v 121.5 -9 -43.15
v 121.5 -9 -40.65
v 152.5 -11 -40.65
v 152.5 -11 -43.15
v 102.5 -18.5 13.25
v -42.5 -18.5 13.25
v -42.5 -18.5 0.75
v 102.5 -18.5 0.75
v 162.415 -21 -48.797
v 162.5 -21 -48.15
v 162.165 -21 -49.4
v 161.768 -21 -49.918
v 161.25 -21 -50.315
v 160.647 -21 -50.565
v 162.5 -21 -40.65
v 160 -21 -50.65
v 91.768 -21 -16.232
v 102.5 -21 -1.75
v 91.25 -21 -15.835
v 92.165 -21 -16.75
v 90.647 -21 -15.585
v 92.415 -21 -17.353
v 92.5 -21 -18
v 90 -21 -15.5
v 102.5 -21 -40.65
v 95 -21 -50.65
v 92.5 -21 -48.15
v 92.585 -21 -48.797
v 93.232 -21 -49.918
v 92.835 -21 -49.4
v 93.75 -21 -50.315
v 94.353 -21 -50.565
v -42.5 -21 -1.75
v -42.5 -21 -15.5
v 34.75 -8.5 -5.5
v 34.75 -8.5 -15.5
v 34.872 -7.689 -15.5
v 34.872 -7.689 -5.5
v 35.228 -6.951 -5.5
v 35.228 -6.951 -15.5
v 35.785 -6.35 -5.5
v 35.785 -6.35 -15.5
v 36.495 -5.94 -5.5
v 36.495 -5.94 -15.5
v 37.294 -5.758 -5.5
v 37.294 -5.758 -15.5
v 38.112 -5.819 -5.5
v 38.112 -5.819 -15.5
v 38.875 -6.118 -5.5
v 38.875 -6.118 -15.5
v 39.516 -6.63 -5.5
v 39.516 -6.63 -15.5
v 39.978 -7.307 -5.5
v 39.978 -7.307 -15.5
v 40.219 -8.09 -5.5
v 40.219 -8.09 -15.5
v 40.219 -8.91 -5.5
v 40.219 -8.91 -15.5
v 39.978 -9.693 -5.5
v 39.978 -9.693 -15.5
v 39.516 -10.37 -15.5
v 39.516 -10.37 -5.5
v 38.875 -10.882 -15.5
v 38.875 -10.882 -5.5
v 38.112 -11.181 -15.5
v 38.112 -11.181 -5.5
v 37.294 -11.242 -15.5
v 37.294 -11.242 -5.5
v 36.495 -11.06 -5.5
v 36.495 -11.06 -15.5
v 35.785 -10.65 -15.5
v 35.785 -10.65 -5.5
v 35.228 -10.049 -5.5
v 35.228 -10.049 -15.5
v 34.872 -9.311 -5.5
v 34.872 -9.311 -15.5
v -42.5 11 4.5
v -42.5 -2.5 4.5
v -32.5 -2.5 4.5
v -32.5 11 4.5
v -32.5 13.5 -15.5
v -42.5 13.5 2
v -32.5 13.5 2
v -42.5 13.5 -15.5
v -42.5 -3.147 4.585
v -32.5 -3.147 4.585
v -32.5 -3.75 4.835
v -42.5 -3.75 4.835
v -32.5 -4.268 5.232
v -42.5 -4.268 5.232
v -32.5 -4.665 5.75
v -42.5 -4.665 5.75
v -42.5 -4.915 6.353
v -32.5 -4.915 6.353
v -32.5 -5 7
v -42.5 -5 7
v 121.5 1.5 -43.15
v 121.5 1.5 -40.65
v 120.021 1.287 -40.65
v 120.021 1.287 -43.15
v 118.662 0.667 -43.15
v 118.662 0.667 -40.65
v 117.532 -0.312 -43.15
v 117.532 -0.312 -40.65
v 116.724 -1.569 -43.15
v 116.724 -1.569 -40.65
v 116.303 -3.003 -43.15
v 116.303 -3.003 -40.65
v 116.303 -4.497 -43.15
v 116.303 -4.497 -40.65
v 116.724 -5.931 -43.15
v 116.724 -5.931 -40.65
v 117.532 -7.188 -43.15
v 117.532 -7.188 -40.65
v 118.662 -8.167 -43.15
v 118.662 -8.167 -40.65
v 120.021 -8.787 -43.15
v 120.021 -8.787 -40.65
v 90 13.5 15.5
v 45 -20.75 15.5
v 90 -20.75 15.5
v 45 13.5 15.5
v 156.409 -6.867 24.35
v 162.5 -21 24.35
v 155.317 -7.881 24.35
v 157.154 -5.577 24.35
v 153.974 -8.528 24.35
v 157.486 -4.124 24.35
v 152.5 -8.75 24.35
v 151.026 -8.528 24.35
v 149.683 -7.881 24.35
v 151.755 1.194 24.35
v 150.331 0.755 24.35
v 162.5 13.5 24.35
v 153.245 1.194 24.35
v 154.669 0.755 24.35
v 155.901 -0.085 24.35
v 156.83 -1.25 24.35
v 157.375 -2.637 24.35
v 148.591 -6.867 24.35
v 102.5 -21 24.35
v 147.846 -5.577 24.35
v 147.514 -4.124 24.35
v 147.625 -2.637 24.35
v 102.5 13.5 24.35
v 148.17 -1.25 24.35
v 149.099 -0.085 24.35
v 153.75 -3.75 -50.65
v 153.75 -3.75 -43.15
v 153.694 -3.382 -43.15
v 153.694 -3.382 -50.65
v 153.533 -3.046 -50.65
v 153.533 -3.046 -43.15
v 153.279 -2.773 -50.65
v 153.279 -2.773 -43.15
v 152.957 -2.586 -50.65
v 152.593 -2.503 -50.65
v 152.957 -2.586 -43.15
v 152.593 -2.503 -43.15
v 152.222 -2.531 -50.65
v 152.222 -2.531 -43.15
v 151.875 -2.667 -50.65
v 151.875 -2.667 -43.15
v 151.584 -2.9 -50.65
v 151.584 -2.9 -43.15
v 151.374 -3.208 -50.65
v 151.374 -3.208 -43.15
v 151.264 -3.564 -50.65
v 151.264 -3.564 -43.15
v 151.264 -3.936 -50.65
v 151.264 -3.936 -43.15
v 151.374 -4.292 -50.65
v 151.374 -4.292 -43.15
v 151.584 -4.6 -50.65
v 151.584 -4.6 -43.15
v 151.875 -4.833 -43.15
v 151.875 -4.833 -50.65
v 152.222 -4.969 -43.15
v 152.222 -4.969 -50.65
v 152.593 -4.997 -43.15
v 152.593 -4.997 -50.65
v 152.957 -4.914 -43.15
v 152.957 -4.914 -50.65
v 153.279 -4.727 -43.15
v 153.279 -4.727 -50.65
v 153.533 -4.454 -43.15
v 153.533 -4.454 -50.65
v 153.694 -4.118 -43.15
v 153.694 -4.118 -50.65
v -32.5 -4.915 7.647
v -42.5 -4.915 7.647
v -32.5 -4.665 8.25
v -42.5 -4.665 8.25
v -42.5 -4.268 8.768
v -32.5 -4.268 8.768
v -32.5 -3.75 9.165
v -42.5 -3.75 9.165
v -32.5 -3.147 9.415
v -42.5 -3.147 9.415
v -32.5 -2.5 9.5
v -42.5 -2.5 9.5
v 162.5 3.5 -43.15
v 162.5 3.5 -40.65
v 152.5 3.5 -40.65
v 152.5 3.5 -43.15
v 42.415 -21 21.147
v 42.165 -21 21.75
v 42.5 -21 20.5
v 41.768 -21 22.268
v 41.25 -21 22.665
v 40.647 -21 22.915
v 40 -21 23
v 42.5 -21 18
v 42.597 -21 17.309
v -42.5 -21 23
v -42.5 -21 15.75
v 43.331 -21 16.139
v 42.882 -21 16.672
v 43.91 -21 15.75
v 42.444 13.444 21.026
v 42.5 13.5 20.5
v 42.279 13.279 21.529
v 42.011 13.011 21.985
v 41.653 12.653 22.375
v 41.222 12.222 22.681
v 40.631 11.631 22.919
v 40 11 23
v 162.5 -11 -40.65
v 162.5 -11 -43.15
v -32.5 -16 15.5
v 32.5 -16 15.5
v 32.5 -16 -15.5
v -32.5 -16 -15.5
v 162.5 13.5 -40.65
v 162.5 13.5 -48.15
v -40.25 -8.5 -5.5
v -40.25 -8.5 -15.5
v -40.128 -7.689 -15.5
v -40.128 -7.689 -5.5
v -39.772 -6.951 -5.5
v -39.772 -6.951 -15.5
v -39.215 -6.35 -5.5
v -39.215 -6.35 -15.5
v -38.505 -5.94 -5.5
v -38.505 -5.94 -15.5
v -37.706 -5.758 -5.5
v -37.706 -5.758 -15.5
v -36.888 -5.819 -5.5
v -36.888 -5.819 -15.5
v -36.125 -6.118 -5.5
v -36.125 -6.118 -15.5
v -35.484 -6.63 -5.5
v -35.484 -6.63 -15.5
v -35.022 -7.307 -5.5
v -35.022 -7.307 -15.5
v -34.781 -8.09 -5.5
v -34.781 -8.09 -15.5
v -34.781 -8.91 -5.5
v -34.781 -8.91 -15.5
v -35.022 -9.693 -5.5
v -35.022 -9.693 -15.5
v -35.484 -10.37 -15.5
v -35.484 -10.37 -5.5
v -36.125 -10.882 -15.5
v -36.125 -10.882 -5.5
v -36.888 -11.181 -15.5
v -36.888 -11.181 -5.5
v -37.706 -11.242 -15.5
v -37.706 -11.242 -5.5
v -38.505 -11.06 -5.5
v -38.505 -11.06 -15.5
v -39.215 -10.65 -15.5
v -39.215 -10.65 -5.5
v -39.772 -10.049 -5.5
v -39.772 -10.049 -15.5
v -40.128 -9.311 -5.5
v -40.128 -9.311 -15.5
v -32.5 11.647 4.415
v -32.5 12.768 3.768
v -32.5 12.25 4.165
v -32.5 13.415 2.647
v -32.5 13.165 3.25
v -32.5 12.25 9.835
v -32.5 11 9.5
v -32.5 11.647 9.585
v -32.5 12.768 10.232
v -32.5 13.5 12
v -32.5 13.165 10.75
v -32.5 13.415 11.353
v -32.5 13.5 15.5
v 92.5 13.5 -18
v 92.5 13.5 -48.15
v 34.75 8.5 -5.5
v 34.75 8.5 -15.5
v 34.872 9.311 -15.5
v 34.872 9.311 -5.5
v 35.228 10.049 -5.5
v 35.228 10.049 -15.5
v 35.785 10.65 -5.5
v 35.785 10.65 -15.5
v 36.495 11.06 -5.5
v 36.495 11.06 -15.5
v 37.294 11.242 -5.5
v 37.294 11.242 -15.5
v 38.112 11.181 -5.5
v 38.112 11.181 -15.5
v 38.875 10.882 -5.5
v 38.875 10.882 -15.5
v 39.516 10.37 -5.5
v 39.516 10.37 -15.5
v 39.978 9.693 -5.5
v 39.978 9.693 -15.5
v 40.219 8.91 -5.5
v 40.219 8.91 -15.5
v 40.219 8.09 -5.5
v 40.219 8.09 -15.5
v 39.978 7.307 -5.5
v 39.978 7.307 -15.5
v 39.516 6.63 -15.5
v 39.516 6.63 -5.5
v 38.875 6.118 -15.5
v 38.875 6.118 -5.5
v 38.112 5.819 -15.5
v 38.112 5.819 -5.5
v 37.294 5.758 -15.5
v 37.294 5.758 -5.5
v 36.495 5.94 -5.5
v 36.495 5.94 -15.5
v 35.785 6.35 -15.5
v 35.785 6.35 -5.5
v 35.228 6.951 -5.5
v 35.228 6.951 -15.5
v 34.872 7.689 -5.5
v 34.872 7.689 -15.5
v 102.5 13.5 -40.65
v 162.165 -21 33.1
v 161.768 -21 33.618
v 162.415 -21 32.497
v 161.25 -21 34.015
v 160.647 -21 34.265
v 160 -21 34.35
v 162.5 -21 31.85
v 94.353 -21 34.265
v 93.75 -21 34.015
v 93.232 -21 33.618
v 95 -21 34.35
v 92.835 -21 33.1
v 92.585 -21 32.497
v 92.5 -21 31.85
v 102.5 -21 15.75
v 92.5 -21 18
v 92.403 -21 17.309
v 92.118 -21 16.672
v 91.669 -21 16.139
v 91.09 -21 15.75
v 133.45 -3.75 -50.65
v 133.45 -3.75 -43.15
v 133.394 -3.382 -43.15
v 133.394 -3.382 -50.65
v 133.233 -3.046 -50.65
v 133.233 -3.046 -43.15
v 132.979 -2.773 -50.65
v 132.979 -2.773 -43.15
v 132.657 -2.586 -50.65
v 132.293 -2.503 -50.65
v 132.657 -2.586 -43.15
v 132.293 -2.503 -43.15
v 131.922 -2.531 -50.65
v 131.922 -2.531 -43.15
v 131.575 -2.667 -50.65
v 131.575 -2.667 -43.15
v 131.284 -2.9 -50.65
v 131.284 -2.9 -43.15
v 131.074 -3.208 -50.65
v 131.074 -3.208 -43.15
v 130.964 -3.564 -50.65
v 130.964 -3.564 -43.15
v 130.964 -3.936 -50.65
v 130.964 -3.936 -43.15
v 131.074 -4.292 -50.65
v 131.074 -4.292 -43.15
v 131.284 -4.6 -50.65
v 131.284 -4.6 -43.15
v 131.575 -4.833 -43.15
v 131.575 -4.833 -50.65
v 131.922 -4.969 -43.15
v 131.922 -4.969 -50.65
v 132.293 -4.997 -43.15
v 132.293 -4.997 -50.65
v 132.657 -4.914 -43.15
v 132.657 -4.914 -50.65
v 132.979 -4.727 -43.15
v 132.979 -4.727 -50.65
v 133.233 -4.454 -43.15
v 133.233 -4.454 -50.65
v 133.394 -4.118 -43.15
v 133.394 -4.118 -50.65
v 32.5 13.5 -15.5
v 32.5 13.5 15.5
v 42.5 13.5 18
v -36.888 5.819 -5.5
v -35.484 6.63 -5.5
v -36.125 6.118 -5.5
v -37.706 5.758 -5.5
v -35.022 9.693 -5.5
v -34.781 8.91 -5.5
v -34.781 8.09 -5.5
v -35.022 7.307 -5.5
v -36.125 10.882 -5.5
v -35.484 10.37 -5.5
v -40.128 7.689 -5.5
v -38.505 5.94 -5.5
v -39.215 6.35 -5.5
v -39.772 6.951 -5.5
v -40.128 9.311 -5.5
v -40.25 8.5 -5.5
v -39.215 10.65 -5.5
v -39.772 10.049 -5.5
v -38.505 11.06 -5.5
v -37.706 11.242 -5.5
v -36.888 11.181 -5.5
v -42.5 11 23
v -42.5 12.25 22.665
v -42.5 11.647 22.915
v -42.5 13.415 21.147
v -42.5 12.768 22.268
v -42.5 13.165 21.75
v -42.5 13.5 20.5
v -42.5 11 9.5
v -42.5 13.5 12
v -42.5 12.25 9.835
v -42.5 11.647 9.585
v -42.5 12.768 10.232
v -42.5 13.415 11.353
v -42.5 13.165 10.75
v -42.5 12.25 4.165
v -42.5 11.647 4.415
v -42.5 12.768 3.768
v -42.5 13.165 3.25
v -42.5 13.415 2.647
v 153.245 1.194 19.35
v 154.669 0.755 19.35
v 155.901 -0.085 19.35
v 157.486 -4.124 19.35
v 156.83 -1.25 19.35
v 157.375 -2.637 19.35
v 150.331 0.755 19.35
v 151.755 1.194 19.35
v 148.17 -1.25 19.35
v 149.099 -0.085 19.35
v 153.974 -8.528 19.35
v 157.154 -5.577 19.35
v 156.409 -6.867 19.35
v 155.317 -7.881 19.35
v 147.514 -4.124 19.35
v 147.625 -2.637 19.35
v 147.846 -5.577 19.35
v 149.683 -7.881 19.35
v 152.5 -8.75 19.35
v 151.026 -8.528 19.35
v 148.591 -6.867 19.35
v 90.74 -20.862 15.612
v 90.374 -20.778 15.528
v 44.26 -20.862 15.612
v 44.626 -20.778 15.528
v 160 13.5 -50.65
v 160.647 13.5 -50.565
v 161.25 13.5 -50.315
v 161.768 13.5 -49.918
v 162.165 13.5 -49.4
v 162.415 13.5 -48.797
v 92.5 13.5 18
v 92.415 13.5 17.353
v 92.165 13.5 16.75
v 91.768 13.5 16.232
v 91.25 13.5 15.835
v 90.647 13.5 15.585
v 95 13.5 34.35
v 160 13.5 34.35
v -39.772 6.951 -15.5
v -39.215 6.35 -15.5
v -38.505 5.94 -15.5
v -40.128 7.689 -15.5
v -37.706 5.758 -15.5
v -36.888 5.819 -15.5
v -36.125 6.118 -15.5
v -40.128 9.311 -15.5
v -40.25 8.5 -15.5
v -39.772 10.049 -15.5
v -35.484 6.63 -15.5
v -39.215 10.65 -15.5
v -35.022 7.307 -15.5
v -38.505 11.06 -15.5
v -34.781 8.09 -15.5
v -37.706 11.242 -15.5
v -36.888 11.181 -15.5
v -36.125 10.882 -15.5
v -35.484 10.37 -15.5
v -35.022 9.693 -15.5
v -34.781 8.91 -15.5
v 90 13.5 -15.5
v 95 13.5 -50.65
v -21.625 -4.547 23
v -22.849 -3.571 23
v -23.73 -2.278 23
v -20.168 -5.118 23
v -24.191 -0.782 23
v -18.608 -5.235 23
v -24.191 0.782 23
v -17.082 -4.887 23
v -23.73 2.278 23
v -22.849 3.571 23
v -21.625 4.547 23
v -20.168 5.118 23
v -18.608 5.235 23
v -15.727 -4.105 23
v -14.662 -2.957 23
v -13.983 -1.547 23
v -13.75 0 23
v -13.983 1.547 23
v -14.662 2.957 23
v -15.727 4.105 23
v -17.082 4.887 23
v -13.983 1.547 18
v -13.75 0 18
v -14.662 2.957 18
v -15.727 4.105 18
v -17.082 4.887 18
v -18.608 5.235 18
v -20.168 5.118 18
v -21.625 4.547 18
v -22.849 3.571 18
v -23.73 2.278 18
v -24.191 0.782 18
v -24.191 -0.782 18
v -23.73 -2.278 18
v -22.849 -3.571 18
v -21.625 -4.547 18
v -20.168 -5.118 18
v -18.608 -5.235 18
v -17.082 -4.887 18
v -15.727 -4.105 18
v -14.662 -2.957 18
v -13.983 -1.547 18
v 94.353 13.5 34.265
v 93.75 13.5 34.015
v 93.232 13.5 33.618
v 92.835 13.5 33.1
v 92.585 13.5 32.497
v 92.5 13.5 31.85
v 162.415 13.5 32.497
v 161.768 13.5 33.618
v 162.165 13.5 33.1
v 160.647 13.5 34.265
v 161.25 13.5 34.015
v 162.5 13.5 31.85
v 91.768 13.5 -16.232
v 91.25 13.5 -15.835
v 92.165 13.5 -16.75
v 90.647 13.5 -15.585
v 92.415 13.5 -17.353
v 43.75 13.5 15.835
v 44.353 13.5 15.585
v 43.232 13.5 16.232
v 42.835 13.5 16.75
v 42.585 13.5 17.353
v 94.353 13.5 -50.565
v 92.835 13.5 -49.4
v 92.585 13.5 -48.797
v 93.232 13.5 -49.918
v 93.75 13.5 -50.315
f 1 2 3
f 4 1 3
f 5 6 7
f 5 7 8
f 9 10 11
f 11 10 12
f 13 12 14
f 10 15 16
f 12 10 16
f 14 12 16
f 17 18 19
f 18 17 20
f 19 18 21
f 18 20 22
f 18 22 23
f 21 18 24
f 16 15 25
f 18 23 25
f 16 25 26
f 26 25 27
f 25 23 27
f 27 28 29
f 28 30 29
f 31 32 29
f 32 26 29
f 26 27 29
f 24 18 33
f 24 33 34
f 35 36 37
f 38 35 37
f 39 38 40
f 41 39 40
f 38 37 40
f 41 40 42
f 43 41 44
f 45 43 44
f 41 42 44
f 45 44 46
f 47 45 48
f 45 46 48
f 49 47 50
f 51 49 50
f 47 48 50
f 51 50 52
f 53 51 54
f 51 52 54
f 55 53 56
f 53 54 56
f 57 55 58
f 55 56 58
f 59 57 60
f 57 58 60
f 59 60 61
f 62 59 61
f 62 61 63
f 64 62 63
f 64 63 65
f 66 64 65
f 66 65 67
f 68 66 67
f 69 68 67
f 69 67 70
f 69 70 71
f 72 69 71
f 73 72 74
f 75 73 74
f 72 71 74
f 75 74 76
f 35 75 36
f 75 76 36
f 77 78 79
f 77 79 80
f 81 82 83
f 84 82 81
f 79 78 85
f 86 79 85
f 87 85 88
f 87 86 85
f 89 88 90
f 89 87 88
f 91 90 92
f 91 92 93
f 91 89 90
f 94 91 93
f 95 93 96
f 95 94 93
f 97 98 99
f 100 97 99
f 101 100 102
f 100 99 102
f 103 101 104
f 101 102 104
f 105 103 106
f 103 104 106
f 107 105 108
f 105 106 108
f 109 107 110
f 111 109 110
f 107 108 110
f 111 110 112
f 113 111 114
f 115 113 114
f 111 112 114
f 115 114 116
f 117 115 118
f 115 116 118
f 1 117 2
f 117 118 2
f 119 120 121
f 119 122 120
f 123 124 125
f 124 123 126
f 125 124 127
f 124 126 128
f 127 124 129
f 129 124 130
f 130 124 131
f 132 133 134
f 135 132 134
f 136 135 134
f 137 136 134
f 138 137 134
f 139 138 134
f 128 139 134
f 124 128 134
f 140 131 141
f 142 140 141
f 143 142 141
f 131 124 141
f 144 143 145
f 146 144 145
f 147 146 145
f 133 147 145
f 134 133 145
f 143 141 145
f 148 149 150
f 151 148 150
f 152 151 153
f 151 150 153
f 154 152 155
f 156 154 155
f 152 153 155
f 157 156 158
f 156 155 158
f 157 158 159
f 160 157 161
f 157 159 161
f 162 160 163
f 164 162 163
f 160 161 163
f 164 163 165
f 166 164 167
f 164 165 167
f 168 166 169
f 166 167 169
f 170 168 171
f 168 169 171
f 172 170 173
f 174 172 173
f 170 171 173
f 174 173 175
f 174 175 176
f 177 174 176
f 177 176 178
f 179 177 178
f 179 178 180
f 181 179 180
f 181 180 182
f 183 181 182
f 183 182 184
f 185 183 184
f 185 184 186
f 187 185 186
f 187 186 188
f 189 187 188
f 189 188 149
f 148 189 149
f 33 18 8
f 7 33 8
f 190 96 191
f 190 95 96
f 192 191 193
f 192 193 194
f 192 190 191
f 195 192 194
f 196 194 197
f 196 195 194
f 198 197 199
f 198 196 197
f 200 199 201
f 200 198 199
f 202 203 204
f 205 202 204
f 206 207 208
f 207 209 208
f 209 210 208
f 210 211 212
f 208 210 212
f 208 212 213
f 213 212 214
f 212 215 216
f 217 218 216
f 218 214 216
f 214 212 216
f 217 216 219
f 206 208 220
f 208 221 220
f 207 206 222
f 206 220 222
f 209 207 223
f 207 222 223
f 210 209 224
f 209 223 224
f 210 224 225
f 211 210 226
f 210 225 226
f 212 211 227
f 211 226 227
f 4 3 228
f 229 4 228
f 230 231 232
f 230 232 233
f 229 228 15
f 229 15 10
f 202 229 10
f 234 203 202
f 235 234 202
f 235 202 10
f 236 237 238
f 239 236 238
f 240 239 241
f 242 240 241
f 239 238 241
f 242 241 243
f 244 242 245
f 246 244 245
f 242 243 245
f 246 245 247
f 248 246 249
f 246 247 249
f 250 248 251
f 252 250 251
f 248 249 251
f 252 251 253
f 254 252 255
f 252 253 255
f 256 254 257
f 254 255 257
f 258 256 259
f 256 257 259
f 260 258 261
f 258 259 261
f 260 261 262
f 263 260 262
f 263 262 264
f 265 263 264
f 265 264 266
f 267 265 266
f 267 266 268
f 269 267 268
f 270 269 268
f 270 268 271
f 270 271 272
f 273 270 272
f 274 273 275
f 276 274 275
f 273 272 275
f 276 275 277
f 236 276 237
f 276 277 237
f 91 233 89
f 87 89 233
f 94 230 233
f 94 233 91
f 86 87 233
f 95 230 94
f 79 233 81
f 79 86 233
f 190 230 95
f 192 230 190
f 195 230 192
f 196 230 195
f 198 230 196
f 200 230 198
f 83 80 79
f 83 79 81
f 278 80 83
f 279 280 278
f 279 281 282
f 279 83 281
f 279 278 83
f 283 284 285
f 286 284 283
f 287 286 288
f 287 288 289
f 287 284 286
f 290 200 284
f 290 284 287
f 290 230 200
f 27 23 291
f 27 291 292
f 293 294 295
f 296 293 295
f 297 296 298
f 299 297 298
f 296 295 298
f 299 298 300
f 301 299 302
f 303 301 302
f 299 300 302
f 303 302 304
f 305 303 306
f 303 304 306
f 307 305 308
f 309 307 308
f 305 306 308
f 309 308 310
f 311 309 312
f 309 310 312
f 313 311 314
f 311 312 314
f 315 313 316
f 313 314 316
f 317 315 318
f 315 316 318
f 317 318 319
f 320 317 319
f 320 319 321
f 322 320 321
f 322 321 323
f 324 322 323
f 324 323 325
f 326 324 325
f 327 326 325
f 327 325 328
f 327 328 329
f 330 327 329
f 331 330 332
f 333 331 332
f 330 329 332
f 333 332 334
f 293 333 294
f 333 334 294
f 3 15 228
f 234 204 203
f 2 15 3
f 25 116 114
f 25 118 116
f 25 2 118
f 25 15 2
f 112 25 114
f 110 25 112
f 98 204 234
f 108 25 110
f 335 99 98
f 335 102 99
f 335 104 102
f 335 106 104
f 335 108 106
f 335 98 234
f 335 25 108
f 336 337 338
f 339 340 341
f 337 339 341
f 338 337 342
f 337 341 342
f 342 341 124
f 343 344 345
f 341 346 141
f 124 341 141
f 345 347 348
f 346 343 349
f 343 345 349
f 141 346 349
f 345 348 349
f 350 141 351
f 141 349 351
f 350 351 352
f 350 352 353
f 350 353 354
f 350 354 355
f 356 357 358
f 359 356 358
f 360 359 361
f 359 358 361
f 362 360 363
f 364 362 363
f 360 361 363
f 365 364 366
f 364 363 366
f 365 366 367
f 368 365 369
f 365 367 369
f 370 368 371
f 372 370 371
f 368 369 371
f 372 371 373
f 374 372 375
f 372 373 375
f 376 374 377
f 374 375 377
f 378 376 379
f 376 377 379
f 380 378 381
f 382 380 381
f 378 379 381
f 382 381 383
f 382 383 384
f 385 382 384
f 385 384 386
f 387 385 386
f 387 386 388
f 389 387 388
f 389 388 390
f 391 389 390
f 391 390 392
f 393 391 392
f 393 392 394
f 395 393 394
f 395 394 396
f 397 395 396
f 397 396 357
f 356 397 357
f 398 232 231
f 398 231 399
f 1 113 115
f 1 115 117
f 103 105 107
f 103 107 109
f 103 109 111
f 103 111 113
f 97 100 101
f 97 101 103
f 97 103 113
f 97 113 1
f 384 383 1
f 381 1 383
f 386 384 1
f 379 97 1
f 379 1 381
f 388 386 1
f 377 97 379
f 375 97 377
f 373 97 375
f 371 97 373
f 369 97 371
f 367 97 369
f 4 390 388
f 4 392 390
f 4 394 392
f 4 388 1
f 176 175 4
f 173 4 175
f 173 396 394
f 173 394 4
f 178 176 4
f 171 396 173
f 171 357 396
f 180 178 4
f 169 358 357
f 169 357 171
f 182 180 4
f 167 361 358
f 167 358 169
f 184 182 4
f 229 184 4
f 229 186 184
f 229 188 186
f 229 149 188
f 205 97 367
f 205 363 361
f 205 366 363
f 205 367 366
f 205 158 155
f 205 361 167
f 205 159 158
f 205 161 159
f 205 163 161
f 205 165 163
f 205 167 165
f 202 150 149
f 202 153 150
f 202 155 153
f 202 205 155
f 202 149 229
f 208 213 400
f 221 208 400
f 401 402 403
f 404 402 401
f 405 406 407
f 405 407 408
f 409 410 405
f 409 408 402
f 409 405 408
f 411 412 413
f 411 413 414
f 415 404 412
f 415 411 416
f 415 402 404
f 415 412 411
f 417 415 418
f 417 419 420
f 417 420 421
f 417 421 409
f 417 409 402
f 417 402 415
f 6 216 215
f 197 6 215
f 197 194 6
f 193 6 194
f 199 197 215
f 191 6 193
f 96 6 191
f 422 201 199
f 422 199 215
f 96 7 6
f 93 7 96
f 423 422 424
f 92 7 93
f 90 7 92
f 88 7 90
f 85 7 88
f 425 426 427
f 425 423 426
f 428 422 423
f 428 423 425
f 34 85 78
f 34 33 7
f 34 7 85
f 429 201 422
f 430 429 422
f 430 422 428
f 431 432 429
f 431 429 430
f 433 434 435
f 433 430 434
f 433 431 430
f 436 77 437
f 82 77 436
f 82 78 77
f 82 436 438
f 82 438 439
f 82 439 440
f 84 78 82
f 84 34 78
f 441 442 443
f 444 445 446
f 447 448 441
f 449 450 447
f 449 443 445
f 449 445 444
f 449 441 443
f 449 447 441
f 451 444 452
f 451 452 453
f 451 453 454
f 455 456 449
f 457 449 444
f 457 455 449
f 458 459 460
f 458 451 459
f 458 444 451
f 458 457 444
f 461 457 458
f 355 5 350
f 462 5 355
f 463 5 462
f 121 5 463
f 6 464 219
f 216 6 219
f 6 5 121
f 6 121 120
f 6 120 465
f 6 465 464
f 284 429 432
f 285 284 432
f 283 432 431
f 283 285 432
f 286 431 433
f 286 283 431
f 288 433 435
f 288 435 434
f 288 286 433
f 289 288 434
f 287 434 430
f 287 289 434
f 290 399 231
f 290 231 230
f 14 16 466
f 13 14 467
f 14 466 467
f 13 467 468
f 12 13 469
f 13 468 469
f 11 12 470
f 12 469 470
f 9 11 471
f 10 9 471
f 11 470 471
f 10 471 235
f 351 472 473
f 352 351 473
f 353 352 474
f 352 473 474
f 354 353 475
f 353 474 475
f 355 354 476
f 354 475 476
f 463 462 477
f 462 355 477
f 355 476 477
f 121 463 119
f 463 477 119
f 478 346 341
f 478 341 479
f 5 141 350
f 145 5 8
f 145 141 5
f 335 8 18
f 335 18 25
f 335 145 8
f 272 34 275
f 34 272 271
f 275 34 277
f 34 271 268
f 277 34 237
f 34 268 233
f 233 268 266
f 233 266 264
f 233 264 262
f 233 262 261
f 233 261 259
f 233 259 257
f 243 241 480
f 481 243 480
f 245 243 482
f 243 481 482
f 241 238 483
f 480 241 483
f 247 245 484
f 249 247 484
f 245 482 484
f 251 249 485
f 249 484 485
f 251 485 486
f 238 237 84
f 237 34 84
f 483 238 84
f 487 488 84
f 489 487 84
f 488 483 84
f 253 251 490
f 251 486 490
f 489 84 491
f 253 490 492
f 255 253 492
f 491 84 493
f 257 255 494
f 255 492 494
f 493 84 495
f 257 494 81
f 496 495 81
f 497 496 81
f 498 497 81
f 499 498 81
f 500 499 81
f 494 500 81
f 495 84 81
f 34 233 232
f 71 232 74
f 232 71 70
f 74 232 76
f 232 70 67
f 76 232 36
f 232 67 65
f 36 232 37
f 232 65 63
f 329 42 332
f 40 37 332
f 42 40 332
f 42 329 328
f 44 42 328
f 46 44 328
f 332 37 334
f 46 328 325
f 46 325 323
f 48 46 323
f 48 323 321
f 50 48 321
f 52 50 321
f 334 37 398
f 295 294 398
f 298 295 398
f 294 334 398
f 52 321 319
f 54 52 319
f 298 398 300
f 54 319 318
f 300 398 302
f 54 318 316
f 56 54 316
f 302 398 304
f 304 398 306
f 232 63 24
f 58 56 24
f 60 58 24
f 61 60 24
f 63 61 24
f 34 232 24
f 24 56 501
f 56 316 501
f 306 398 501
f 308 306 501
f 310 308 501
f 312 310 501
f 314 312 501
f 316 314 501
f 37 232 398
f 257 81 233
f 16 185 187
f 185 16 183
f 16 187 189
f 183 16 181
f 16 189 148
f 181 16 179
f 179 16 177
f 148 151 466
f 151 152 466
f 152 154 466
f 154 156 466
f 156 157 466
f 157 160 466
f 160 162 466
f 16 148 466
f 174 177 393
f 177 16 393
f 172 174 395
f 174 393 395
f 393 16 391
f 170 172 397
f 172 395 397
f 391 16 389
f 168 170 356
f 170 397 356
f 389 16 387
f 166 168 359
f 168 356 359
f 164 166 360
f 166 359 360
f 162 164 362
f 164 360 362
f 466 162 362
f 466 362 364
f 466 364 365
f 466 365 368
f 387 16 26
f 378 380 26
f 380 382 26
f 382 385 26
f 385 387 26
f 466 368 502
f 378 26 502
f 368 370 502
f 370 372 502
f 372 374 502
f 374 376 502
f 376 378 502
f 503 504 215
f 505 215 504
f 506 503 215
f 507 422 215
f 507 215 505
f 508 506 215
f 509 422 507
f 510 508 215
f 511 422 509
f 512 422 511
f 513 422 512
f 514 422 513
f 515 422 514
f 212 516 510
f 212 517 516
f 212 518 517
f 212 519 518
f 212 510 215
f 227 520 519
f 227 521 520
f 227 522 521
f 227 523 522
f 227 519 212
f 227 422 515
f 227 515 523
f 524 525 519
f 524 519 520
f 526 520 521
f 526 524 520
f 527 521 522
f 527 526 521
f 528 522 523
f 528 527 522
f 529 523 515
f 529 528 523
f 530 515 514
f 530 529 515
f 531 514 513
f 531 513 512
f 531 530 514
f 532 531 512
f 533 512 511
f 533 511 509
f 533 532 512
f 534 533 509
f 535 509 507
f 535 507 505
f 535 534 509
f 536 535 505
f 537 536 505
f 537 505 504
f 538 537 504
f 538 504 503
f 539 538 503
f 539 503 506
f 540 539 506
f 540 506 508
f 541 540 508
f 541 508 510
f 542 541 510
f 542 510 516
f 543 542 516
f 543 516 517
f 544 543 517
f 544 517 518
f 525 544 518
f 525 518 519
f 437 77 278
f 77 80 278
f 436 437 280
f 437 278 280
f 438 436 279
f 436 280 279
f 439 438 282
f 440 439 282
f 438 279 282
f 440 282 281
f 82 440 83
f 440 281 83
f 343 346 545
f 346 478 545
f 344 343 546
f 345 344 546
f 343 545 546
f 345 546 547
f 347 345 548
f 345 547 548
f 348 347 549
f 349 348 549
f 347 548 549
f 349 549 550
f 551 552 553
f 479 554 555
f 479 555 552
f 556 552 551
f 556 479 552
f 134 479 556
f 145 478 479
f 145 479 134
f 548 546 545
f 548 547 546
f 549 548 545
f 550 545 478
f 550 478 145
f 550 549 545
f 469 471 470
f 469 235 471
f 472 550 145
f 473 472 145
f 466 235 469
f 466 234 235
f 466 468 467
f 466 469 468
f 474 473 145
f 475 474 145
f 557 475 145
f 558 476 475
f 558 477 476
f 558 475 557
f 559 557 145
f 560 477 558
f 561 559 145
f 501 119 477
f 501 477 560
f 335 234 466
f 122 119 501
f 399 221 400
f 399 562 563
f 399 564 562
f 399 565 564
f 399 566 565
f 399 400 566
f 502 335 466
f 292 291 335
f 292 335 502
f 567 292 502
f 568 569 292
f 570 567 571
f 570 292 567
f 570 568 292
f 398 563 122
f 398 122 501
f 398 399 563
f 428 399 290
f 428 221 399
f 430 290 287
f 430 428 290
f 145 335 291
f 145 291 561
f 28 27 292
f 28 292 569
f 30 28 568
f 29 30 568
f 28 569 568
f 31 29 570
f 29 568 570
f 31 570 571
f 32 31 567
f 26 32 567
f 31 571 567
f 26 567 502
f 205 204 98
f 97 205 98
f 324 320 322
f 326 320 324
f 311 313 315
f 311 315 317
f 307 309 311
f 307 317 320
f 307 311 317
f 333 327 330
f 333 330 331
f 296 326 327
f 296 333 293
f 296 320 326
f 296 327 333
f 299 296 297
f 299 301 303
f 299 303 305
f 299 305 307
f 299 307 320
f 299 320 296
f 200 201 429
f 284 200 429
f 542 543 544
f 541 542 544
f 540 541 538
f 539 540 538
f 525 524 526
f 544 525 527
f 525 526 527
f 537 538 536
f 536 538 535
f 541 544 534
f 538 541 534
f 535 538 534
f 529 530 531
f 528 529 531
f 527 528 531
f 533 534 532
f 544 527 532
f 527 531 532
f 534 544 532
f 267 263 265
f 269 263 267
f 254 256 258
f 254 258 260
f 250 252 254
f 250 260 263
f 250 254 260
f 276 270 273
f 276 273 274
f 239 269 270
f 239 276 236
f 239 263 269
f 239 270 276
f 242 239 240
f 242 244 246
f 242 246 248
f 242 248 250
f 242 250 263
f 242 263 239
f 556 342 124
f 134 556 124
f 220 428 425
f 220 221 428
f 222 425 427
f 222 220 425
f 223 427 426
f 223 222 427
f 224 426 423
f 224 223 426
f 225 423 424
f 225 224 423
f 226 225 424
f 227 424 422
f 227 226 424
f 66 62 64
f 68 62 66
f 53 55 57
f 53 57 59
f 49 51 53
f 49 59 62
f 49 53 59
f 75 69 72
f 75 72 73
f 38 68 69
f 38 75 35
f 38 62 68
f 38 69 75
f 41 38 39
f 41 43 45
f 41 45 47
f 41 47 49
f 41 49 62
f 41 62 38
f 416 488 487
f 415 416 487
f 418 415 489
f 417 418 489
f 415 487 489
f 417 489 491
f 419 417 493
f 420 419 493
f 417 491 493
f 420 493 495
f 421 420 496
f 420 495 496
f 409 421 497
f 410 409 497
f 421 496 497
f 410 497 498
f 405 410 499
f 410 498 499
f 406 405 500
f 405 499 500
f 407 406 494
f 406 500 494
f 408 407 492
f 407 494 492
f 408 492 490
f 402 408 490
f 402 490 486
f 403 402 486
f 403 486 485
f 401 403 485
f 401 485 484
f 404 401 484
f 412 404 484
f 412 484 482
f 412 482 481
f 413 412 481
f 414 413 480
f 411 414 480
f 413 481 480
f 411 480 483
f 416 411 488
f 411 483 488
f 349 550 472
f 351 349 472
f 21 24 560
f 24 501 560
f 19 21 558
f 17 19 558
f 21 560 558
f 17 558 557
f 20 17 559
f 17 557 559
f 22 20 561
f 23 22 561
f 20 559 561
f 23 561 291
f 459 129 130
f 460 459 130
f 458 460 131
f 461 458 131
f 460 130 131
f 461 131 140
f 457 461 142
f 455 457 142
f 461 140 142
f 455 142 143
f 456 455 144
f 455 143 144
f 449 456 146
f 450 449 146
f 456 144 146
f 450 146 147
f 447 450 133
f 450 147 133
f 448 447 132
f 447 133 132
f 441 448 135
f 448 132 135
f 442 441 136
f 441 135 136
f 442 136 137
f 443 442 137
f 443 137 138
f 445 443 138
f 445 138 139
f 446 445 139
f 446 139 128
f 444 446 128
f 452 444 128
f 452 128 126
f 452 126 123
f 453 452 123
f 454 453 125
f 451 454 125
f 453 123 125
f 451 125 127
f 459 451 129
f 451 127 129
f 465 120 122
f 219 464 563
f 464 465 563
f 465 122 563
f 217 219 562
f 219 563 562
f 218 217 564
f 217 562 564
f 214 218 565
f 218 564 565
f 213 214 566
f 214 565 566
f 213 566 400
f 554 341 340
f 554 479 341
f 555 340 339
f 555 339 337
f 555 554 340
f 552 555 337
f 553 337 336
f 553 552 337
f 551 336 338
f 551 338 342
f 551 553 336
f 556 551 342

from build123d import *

# Parameters (mm, degrees)
SKETCH1_W                 = 10
SKETCH1_H                 = 29.5
SKETCH1_R                 = 2.75
BOSS_EXTRUDE1_DEPTH       = 15.5
SKETCH15_R                = 2.75
CUT_EXTRUDE5_DEPTH        = 10
SKETCH2_W                 = 85
SKETCH2_H                 = 34.5
SKETCH2_R                 = 5.25
BOSS_EXTRUDE2_DEPTH       = 7.5
SKETCH4_W                 = 85
SKETCH4_H                 = 34.5
BOSS_EXTRUDE3_DEPTH       = 10
SKETCH5_W                 = 10
SKETCH5_H                 = 34.5
BOSS_EXTRUDE4_DEPTH       = 60
SKETCH6_R                 = 5
BOSS_EXTRUDE5_DEPTH       = 5
CUT_EXTRUDE2_DEPTH        = 2.5
SKETCH10_W                = 5
SKETCH10_H                = 18.5
CUT_EXTRUDE4_DEPTH        = 10
F_2_5MM_DOWEL_HOLE1_D     = 2.5
F_2_5MM_DOWEL_HOLE1_DEPTH = 10
F_2_5MM_DOWEL_HOLE1_TIP   = 0.751075774
FILLET1_R                 = 2.5
SKETCH14_R                = 5.25
BOSS_EXTRUDE6_DEPTH       = 2.5
FILLET2_R                 = 2.5
SKETCH17_W                = 145
SKETCH17_H                = 12.5
CUT_EXTRUDE7_DEPTH        = 2.5
CHAMFER1_SIZE             = 2.5


# Some blends are built 0.0001 mm under size
with BuildPart() as part:
    # Sketch1 → Boss-Extrude1 (new, symmetric)
    # profile 1 of 8: a face of its own
    with BuildSketch(Plane.XY):
        with Locations((-37.5, -1.25)):
            Rectangle(SKETCH1_W, SKETCH1_H)
        with Locations((-37.5, -8.5)):
            Circle(SKETCH1_R, mode=Mode.SUBTRACT)
        with Locations((-37.5, 8.5)):
            Circle(SKETCH1_R, mode=Mode.SUBTRACT)
    # profile 2 of 8: a face of its own
    with BuildSketch(Plane.XY):
        Polygon((-32.5, -16), (-42.5, -16), (-42.5, -21), (42.5, -21), (42.5, -16), (32.5, -16), align=None)
    # profile 3 of 8: a face of its own
    with BuildSketch(Plane.XY):
        with Locations((37.5, -1.25)):
            Rectangle(SKETCH1_W, SKETCH1_H)
        with Locations((37.5, -8.5)):
            Circle(SKETCH1_R, mode=Mode.SUBTRACT)
        with Locations((37.5, 8.5)):
            Circle(SKETCH1_R, mode=Mode.SUBTRACT)
    # profile 4 of 8: a face of its own
    with BuildSketch(Plane.XY):
        with Locations((-37.5, 8.5)):
            Circle(SKETCH1_R)
    # profile 5 of 8: a face of its own
    with BuildSketch(Plane.XY):
        with Locations((-37.5, -8.5)):
            Circle(SKETCH1_R)
    # profile 6 of 8: a face of its own
    with BuildSketch(Plane.XY):
        with Locations((37.5, 8.5)):
            Circle(SKETCH1_R)
    # profile 7 of 8: a face of its own
    with BuildSketch(Plane.XY):
        with Locations((37.5, -8.5)):
            Circle(SKETCH1_R)
    # profile 8 of 8: a face of its own
    with BuildSketch(Plane.XY):
        Polygon((42.5, -21), (92.5, -21), (92.5, 13.5), (42.5, 13.5), (42.5, -16), align=None)
    extrude(amount=BOSS_EXTRUDE1_DEPTH, both=True)

    # Sketch15 → Cut-Extrude5 (cut)
    with BuildSketch(Plane(origin=(0, 0, -15.5), x_dir=(-1, 0, 0), z_dir=(0, 0, -1))):
        with Locations((-37.5, 8.5)):
            Circle(SKETCH15_R)
        with Locations((-37.5, -8.5)):
            Circle(SKETCH15_R)
        with Locations((37.5, 8.5)):
            Circle(SKETCH15_R)
        with Locations((37.5, -8.5)):
            Circle(SKETCH15_R)
    extrude(amount=-CUT_EXTRUDE5_DEPTH, mode=Mode.SUBTRACT)

    # Sketch2 → Boss-Extrude2 (add)
    with BuildSketch(Plane.XY.offset(15.5)):
        with Locations((0, -3.75)):
            Rectangle(SKETCH2_W, SKETCH2_H)
        with Locations((-19, 0)):
            Circle(SKETCH2_R, mode=Mode.SUBTRACT)
    extrude(amount=BOSS_EXTRUDE2_DEPTH)

    # Sketch4 → Boss-Extrude3 (add)
    with BuildSketch(Plane(origin=(92.5, 0, 0), x_dir=(0, 0, -1), z_dir=(1, 0, 0))):
        with Locations((8.15, -3.75)):
            Rectangle(SKETCH4_W, SKETCH4_H)
    extrude(amount=BOSS_EXTRUDE3_DEPTH)

    # Sketch5 → Boss-Extrude4 (add)
    with BuildSketch(Plane(origin=(102.5, 0, 0), x_dir=(0, 0, -1), z_dir=(1, 0, 0))):
        with Locations((-29.35, -3.75)):
            Rectangle(SKETCH5_W, SKETCH5_H)
        with Locations((45.65, -3.75)):
            Rectangle(SKETCH5_W, SKETCH5_H)
    extrude(amount=BOSS_EXTRUDE4_DEPTH)

    # Sketch6 → Boss-Extrude5 (add)
    with BuildSketch(Plane(origin=(0, 0, 24.35), x_dir=(-1, 0, 0), z_dir=(0, 0, -1))):
        with Locations(Location((-152.5, -3.75, 0), (0, 0, 270))):
            Circle(SKETCH6_R)
    extrude(amount=BOSS_EXTRUDE5_DEPTH)

    # Sketch8 → Cut-Extrude2 (cut)
    with BuildSketch(Plane.XY.offset(-40.65)):
        with BuildLine():
            ThreePointArc((121.500000004, 1.499999993), (116.250000004, -3.750000007), (121.500000004, -9.000000007))
            Line((121.500000004, -9.000000007), (152.500000004, -11.000000007))
            Line((152.500000004, -11.000000007), (162.5, -11.000000007))
            Line((162.5, -11.000000007), (162.5, 3.499999993))
            Line((162.5, 3.499999993), (152.500000004, 3.499999993))
            Line((152.500000004, 3.499999993), (121.500000004, 1.499999993))
        make_face()
    extrude(amount=-CUT_EXTRUDE2_DEPTH, mode=Mode.SUBTRACT)

    # Sketch10 → Cut-Extrude4 (cut)
    with BuildSketch(Plane.ZY.offset(42.5)):
        with Locations((7, 4.25)):
            Rectangle(SKETCH10_W, SKETCH10_H)
    extrude(amount=-CUT_EXTRUDE4_DEPTH, mode=Mode.SUBTRACT)

    # Ø2.5mm Dowel Hole1
    with Locations(Plane(origin=(0, 0, -50.65), x_dir=(-1, 0, 0), z_dir=(0, 0, -1))):
        with Locations((-132.2, -3.75), (-152.5, -3.75)):
            Hole(F_2_5MM_DOWEL_HOLE1_D / 2, depth=F_2_5MM_DOWEL_HOLE1_DEPTH)
            with Locations((0, 0, -(F_2_5MM_DOWEL_HOLE1_DEPTH + F_2_5MM_DOWEL_HOLE1_TIP / 2))):  # 118° drill point
                Cone(0, F_2_5MM_DOWEL_HOLE1_D / 2, F_2_5MM_DOWEL_HOLE1_TIP, mode=Mode.SUBTRACT)

    # Fillet1
    fillet1_edges = [part.edges().sort_by_distance(p)[0] for p in [
        (92.5, -3.75, -15.5),
        (92.5, -3.75, 15.5),
        (42.5, -3.75, 23),
        (0, 13.5, 23),
        (42.5, -3.75, 15.5),
        (92.5, -3.75, -50.65),
        (92.5, -3.75, 34.35),
        (162.5, -3.75, 34.35),
        (162.5, -3.75, -50.65),
    ]]
    fillet(fillet1_edges, radius=FILLET1_R)

    # Sketch14 → Boss-Extrude6 (add)
    with BuildSketch(Plane(origin=(0, 0, 15.5), x_dir=(-1, 0, 0), z_dir=(0, 0, -1))):
        with Locations((19, 0)):
            Circle(SKETCH14_R)
    extrude(amount=-BOSS_EXTRUDE6_DEPTH)

    # Fillet2
    fillet2_edges = [part.edges().sort_by_distance(p)[0] for p in [
        (-37.5, -5, 9.5),
        (-37.5, -5, 4.5),
    ]]
    fillet(fillet2_edges, radius=FILLET2_R - 0.0001)  # a hair under: the kernel refuses the full size
    fillet2_2_edges = [part.edges().sort_by_distance(p)[0] for p in [
        (-37.5, 13.5, 9.5),
        (-37.5, 13.5, 4.5),
    ]]
    fillet(fillet2_2_edges, radius=FILLET2_R)

    # Sketch17 → Cut-Extrude7 (cut)
    with BuildSketch(Plane.XZ.offset(21)):
        with Locations((30, 7)):
            Rectangle(SKETCH17_W, SKETCH17_H)
    extrude(amount=-CUT_EXTRUDE7_DEPTH, mode=Mode.SUBTRACT)

    # Chamfer1
    # the kernel refuses this chamfer: 2.5 mm, written as the material it takes off along each edge
    with BuildSketch(Plane(origin=(108.92920747, -21, 0.75), x_dir=(0, -0.027495876610586317, -0.9996219169112968), z_dir=(-1, 0, 0))) as chamfer1_piece_1_section:
        Polygon((CHAMFER1_SIZE * 0.999621916911, -CHAMFER1_SIZE * 0.0274958766106), (-CHAMFER1_SIZE * 0.0274958766106, -CHAMFER1_SIZE * 0.999621916911), (0, 0), align=None)
    chamfer1_piece_1 = extrude(amount=157.85841494, mode=Mode.PRIVATE)
    chamfer1_piece_1 = split(chamfer1_piece_1, bisect_by=Plane(origin=(30, -18.5, -0.076010386), z_dir=(0, -1, 0)), keep=Keep.TOP, mode=Mode.PRIVATE)
    add(chamfer1_piece_1, mode=Mode.SUBTRACT)
    with BuildSketch(Plane(origin=(-48.92920747, -21, 13.25), x_dir=(0, 0.9996219169112968, -0.027495876610586317), z_dir=(1, 0, 0))) as chamfer1_piece_2_section:
        Polygon((CHAMFER1_SIZE * 0.999621916911, CHAMFER1_SIZE * 0.0274958766106), (-CHAMFER1_SIZE * 0.0274958766106, CHAMFER1_SIZE * 0.999621916911), (0, 0), align=None)
    chamfer1_piece_2 = extrude(amount=157.85841494, mode=Mode.PRIVATE)
    chamfer1_piece_2 = split(chamfer1_piece_2, bisect_by=Plane(origin=(30, -18.5, 14.076010386), z_dir=(0, -1, 0)), keep=Keep.TOP, mode=Mode.PRIVATE)
    add(chamfer1_piece_2, mode=Mode.SUBTRACT)


solid = part.part
